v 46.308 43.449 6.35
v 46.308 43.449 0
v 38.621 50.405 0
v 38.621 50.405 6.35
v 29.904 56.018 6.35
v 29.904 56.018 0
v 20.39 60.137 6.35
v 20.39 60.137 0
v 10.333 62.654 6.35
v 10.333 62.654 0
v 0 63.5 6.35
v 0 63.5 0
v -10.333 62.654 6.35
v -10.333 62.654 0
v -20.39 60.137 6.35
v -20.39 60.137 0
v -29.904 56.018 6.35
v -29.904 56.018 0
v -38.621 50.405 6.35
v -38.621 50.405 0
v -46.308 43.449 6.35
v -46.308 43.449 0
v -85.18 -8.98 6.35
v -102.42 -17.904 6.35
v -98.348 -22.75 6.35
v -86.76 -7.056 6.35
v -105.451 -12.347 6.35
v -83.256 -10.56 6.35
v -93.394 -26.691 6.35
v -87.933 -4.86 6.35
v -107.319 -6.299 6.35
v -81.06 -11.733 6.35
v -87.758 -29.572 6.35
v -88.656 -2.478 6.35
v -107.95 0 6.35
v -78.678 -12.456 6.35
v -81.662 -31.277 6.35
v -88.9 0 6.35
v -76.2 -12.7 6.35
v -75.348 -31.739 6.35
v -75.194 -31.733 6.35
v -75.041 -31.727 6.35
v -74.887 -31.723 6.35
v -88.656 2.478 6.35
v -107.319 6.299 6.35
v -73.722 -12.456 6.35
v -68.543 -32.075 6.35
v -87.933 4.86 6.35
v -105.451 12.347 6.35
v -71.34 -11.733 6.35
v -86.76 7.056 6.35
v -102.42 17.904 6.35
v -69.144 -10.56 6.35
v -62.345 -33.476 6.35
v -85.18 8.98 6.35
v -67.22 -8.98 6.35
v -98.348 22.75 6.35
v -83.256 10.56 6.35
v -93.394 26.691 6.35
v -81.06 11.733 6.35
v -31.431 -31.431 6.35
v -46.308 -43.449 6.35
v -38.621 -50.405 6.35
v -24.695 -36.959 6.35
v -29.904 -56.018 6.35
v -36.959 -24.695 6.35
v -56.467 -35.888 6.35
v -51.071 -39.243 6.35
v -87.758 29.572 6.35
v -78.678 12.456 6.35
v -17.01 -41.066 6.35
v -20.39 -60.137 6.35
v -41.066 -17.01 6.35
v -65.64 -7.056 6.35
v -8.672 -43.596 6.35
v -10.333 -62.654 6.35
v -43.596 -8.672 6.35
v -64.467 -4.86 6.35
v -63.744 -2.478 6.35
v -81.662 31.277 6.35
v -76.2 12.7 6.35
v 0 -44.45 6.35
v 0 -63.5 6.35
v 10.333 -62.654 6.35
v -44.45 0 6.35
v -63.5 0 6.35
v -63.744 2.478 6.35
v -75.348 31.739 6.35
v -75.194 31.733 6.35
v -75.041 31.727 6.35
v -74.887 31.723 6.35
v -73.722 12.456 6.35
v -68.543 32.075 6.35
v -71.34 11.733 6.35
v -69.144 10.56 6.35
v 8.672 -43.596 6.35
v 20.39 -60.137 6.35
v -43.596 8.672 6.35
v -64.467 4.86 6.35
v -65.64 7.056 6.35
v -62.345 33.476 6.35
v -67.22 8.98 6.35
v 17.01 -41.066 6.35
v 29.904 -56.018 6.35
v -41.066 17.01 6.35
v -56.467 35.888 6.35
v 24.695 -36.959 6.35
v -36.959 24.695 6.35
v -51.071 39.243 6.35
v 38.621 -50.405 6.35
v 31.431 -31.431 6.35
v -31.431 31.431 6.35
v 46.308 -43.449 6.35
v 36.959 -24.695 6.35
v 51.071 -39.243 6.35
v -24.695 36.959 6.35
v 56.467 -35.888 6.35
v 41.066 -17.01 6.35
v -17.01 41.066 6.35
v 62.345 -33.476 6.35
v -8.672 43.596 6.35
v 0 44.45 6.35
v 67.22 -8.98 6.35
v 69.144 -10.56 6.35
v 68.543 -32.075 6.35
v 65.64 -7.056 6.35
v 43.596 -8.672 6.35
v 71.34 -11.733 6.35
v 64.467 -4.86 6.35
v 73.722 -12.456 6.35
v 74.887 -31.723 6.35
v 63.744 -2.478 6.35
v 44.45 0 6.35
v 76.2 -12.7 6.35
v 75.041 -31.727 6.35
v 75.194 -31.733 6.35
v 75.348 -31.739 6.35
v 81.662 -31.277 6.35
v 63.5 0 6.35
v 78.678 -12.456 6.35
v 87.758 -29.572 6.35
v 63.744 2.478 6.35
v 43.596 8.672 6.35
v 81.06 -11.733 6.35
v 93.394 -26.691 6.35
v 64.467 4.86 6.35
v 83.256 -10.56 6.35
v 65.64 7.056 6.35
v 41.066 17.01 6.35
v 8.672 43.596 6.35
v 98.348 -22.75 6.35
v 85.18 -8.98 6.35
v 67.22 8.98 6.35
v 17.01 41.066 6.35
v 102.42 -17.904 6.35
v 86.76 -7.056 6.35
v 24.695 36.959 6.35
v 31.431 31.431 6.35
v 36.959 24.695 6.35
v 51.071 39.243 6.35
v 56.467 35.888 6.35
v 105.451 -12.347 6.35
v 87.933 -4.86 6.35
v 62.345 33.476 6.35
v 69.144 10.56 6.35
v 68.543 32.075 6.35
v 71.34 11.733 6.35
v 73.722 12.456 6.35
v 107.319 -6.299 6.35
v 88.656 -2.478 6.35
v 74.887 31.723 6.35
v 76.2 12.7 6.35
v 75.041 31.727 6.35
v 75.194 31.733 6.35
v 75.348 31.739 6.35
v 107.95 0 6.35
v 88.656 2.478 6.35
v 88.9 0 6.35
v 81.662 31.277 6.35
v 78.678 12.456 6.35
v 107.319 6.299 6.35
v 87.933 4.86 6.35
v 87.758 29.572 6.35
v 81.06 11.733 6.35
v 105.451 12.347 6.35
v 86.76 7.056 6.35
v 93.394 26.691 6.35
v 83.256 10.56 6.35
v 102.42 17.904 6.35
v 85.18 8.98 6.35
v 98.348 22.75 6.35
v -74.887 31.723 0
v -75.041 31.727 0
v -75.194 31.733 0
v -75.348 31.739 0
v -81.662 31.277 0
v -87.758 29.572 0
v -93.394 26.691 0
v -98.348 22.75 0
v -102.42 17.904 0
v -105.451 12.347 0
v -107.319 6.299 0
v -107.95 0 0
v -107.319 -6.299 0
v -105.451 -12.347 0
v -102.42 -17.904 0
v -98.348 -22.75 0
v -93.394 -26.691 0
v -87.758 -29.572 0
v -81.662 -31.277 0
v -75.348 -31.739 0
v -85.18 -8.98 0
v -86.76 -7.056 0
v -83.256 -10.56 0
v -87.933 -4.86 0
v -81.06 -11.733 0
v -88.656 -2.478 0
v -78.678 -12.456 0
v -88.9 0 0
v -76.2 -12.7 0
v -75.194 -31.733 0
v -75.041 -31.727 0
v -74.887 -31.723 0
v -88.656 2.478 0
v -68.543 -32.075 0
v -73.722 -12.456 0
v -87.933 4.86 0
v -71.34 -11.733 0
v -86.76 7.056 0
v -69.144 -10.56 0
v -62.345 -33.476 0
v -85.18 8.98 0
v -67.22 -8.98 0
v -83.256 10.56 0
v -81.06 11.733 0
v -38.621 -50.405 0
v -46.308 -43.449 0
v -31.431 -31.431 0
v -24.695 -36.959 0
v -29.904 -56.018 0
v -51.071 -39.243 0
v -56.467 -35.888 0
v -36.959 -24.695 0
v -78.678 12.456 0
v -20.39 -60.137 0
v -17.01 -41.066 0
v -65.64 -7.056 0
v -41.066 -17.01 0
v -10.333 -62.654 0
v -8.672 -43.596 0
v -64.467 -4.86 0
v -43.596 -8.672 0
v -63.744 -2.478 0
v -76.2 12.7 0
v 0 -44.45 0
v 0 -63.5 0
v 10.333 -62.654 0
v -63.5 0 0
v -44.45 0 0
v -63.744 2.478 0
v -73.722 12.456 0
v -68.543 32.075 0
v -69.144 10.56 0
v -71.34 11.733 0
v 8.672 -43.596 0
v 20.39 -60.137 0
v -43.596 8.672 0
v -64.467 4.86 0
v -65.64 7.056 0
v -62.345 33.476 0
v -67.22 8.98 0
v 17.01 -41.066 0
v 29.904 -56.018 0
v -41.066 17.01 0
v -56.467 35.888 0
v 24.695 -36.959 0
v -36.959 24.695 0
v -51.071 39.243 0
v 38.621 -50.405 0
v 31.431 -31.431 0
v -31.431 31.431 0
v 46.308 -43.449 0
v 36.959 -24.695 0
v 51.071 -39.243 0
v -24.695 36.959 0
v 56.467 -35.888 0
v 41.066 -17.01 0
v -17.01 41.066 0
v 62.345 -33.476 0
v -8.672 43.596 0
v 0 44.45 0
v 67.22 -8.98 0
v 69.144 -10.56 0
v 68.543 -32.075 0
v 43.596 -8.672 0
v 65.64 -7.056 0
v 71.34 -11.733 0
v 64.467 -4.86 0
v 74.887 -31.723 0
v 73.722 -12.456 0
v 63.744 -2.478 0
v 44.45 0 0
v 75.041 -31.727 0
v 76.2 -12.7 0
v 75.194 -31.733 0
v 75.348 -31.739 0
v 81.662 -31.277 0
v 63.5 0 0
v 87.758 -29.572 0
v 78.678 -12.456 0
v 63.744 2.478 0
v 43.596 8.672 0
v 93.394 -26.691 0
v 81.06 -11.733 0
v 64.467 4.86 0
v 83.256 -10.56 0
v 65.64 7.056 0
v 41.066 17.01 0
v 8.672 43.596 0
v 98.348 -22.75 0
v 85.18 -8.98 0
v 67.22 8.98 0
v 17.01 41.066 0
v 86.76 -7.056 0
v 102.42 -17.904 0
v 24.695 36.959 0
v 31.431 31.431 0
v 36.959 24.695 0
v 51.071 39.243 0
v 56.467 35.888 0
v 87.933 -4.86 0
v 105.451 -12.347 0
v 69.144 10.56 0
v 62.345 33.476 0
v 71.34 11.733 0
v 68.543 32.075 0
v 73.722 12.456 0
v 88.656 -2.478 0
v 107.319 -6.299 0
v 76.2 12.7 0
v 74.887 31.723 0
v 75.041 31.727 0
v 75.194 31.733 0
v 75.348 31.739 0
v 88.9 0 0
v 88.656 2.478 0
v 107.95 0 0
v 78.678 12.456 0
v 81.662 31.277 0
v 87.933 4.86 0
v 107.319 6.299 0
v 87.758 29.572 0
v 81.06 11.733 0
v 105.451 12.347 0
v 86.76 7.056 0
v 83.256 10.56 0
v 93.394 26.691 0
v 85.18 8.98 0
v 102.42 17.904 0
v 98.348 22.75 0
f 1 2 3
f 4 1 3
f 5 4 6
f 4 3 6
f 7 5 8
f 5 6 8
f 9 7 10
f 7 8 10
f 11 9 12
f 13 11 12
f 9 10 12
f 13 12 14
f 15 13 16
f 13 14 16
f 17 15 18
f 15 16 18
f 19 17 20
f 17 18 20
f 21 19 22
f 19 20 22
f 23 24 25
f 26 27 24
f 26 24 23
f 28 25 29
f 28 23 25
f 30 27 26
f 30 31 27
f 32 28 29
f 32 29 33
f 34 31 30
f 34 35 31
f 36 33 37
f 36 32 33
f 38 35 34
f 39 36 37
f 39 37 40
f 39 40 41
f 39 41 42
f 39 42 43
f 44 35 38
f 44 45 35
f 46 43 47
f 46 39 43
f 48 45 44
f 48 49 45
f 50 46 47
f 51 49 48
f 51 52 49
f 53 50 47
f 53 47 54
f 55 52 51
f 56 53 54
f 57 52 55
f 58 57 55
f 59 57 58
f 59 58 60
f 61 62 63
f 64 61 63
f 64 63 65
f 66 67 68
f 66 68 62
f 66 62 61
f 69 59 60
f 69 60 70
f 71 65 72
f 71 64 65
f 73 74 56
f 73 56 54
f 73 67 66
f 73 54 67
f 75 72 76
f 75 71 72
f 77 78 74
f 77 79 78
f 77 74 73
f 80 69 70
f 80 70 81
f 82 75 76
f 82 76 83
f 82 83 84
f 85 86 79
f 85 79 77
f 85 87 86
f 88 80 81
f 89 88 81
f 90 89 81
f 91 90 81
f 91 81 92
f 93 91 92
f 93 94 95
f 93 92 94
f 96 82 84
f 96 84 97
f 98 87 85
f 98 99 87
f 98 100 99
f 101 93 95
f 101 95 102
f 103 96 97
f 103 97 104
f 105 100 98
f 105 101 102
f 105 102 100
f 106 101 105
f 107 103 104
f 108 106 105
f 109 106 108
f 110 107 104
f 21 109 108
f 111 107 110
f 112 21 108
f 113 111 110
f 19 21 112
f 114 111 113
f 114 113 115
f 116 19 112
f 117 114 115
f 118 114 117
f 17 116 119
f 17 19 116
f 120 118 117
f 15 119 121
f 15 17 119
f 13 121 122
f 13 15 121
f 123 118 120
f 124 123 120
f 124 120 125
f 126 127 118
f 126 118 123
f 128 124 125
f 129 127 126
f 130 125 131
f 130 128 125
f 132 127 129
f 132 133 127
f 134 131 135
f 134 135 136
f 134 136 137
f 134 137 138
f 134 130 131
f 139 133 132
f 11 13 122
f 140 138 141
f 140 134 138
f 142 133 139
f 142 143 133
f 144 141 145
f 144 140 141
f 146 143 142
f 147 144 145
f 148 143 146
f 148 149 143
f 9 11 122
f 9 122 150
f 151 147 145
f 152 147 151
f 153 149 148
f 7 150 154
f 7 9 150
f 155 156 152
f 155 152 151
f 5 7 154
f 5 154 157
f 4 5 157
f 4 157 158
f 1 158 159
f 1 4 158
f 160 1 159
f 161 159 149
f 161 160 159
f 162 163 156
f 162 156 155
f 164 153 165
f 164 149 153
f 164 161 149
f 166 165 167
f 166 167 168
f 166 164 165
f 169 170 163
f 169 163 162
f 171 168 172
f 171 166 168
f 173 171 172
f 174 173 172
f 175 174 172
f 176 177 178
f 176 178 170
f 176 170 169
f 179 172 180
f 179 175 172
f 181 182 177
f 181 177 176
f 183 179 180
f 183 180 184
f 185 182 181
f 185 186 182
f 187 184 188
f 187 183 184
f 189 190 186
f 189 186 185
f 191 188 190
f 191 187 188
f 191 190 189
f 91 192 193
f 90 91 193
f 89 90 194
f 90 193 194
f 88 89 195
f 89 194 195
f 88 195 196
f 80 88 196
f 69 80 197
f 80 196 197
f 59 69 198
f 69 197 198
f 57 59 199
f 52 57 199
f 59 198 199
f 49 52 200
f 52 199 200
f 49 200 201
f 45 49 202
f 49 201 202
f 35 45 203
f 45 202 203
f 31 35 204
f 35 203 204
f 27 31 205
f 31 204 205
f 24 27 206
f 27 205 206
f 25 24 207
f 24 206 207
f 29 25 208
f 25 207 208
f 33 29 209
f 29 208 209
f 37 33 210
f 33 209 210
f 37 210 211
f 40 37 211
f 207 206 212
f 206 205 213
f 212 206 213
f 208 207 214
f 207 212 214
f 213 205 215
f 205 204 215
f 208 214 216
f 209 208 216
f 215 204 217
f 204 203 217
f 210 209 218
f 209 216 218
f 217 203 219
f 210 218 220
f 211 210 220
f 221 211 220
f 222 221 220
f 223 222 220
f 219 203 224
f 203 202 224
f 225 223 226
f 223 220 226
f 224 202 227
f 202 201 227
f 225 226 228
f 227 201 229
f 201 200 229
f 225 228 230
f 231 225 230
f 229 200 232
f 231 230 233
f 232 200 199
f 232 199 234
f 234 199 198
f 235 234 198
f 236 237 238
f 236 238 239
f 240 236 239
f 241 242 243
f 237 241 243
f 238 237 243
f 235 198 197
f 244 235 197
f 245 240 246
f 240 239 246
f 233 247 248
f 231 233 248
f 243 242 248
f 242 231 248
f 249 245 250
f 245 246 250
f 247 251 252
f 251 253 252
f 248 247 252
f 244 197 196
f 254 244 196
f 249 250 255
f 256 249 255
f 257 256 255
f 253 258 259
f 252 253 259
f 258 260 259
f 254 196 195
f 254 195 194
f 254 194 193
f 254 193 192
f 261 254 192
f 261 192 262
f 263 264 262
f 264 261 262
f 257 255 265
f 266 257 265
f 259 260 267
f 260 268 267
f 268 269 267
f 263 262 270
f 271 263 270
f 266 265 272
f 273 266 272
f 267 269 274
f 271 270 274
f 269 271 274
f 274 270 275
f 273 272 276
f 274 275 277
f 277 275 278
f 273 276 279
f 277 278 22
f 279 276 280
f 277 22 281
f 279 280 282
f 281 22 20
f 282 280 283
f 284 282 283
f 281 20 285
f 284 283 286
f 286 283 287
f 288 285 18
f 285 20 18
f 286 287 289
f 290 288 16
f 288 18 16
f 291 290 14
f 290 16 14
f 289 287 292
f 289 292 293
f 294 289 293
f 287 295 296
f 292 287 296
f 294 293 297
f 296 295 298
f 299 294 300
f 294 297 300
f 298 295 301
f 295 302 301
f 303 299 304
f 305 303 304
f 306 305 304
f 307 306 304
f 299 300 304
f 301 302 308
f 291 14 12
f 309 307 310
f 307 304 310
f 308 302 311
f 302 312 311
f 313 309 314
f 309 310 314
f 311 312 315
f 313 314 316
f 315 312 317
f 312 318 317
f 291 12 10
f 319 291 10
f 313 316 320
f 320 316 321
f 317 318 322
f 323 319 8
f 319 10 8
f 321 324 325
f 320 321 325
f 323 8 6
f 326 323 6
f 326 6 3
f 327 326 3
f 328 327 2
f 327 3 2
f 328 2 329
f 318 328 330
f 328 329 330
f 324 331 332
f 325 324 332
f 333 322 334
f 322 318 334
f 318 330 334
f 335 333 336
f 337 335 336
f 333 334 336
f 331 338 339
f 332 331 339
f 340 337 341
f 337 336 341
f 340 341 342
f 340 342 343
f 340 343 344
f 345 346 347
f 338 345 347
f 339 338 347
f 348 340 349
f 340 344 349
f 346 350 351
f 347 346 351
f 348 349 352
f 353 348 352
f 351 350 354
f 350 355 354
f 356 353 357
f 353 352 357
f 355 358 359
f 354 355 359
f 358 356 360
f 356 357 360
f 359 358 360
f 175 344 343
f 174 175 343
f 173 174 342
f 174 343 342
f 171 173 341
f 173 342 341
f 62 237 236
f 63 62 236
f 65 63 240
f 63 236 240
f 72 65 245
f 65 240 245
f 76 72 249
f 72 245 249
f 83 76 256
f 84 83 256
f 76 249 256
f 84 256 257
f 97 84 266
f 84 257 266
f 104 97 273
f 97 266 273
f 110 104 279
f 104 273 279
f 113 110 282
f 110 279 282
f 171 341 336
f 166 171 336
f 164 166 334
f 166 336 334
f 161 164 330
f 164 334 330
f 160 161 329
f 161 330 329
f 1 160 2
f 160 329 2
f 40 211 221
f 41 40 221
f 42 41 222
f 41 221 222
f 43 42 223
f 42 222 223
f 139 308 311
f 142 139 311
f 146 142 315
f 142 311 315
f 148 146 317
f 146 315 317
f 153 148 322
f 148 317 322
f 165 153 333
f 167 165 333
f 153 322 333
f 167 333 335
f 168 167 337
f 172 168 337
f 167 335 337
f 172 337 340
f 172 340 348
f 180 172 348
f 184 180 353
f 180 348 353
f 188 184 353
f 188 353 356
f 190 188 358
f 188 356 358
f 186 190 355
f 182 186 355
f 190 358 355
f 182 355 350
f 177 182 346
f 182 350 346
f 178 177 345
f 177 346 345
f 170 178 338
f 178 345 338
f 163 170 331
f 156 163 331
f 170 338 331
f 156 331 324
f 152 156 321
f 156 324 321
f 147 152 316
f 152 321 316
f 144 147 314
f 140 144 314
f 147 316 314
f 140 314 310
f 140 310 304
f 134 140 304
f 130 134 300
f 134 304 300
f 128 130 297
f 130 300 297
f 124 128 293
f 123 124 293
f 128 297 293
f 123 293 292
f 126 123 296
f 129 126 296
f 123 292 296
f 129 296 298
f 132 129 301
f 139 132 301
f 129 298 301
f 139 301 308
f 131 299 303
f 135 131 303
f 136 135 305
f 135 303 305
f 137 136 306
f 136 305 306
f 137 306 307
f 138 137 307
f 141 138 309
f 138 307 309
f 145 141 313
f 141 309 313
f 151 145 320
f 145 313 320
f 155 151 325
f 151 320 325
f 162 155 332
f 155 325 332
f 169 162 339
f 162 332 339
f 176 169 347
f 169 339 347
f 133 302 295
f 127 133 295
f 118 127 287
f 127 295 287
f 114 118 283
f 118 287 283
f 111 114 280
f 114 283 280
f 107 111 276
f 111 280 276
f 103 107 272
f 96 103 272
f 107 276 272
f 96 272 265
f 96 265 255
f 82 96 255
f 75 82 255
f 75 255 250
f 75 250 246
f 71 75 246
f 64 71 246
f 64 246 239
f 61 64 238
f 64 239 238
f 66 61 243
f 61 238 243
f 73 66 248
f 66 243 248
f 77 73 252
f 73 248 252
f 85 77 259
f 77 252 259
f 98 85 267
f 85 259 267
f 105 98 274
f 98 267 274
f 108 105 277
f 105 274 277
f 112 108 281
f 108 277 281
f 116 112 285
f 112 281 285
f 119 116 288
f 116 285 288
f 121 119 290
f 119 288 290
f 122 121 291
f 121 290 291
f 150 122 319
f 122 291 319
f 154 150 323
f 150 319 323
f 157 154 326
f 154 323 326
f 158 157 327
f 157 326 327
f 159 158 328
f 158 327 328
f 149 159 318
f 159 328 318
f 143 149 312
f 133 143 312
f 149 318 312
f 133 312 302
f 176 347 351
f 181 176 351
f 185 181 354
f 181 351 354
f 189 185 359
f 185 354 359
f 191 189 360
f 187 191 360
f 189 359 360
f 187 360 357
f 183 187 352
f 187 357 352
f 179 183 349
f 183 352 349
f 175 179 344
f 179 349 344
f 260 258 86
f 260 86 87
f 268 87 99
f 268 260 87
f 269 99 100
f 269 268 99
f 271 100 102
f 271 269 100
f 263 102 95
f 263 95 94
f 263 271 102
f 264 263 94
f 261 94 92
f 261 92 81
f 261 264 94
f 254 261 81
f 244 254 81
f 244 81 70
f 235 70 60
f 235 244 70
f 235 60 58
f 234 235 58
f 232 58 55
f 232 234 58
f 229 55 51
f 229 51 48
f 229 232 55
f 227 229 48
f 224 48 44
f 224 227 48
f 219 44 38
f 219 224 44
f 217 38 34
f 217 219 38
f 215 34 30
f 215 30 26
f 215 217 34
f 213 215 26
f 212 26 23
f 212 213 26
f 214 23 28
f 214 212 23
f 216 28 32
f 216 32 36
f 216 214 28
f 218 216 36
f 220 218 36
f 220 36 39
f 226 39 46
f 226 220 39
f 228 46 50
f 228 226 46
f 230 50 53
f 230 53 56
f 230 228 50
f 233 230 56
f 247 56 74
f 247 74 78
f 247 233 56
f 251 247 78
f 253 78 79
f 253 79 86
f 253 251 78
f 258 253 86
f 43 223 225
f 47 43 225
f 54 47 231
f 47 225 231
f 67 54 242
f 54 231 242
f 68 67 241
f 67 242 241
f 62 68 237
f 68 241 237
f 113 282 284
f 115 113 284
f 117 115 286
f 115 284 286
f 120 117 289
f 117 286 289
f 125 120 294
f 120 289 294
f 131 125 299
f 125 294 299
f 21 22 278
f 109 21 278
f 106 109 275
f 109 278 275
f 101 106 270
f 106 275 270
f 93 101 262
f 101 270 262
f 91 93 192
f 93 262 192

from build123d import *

# Parameters (mm, degrees)
F0_R     = 12.7
F1_DEPTH = 6.35


with BuildPart() as f1:
    # F0 (on Top) → F1 (new body)
    with BuildSketch(Plane.XY):
        with BuildLine():
            ThreePointArc((-57.94375, 25.976370723), (-52.8530385151, 35.1966805213), (-46.3083103346, 43.4487099228))
            ThreePointArc((-46.3083103346, 43.4487099228), (-59.3557480022, 34.5595657373), (-74.8865363941, 31.7228200726))
            ThreePointArc((-74.8865363941, 31.7228200726), (-66.002017715, 30.0676513435), (-57.94375, 25.976370723))
        make_face()
        with BuildLine():
            ThreePointArc((-44.45, 0), (-48.024670033, 14.636026826), (-57.94375, 25.976370723))
            ThreePointArc((-57.94375, 25.976370723), (-62.0954029096, 13.2819779212), (-63.5, 0))
            ThreePointArc((-63.5, 0), (-62.0954029096, -13.2819779212), (-57.94375, -25.976370723))
            ThreePointArc((-57.94375, -25.976370723), (-48.024670033, -14.636026826), (-44.45, 0))
        make_face()
        with BuildLine():
            ThreePointArc((-63.5, 0), (-62.0954029096, 13.2819779212), (-57.94375, 25.976370723))
            ThreePointArc((-57.94375, 25.976370723), (-66.002017715, 30.0676513435), (-74.8865363941, 31.7228200726))
            ThreePointArc((-74.8865363941, 31.7228200726), (-75.1174911921, 31.7299983006), (-75.3483982089, 31.7385770694))
            ThreePointArc((-75.3483982089, 31.7385770694), (-107.95, 0), (-75.3483982089, -31.7385770694))
            ThreePointArc((-75.3483982089, -31.7385770694), (-75.1174911921, -31.7299983006), (-74.8865363941, -31.7228200726))
            ThreePointArc((-74.8865363941, -31.7228200726), (-66.002017715, -30.0676513435), (-57.94375, -25.976370723))
            ThreePointArc((-57.94375, -25.976370723), (-62.0954029096, -13.2819779212), (-63.5, 0))
        make_face()
        with Locations((-76.2, 0)):
            Circle(F0_R, mode=Mode.SUBTRACT)
        with BuildLine():
            ThreePointArc((57.94375, -25.976370723), (48.024670033, -14.636026826), (44.45, 0))
            ThreePointArc((44.45, 0), (0, -44.45), (-44.45, 0))
            ThreePointArc((-44.45, 0), (-48.024670033, -14.636026826), (-57.94375, -25.976370723))
            ThreePointArc((-57.94375, -25.976370723), (-52.8530385151, -35.1966805213), (-46.3083103346, -43.4487099228))
            ThreePointArc((-46.3083103346, -43.4487099228), (0, -63.5), (46.3083103346, -43.4487099228))
            ThreePointArc((46.3083103346, -43.4487099228), (52.8530385151, -35.1966805213), (57.94375, -25.976370723))
        make_face()
        with BuildLine():
            ThreePointArc((-46.3083103346, -43.4487099228), (-52.8530385151, -35.1966805213), (-57.94375, -25.976370723))
            ThreePointArc((-57.94375, -25.976370723), (-66.002017715, -30.0676513435), (-74.8865363941, -31.7228200726))
            ThreePointArc((-74.8865363941, -31.7228200726), (-59.3557480022, -34.5595657373), (-46.3083103346, -43.4487099228))
        make_face()
        with BuildLine():
            ThreePointArc((57.94375, 25.976370723), (52.8530385151, 35.1966805213), (46.3083103346, 43.4487099228))
            ThreePointArc((46.3083103346, 43.4487099228), (0, 63.5), (-46.3083103346, 43.4487099228))
            ThreePointArc((-46.3083103346, 43.4487099228), (-52.8530385151, 35.1966805213), (-57.94375, 25.976370723))
            ThreePointArc((-57.94375, 25.976370723), (-48.024670033, 14.636026826), (-44.45, 0))
            ThreePointArc((-44.45, 0), (0, 44.45), (44.45, 0))
            ThreePointArc((44.45, 0), (48.024670033, 14.636026826), (57.94375, 25.976370723))
        make_face()
        with BuildLine():
            ThreePointArc((63.5, 0), (62.0954029096, 13.2819779212), (57.94375, 25.976370723))
            ThreePointArc((57.94375, 25.976370723), (48.024670033, 14.636026826), (44.45, 0))
            ThreePointArc((44.45, 0), (48.024670033, -14.636026826), (57.94375, -25.976370723))
            ThreePointArc((57.94375, -25.976370723), (62.0954029096, -13.2819779212), (63.5, 0))
        make_face()
        with BuildLine():
            ThreePointArc((74.8865363941, 31.7228200726), (66.002017715, 30.0676513435), (57.94375, 25.976370723))
            ThreePointArc((57.94375, 25.976370723), (62.0954029096, 13.2819779212), (63.5, 0))
            ThreePointArc((63.5, 0), (62.0954029096, -13.2819779212), (57.94375, -25.976370723))
            ThreePointArc((57.94375, -25.976370723), (66.002017715, -30.0676513435), (74.8865363941, -31.7228200726))
            ThreePointArc((74.8865363941, -31.7228200726), (75.1174911921, -31.7299983006), (75.3483982089, -31.7385770694))
            ThreePointArc((75.3483982089, -31.7385770694), (98.3475071186, -22.7497346893), (107.95, 0))
            ThreePointArc((107.95, 0), (98.3475071186, 22.7497346893), (75.3483982089, 31.7385770694))
            ThreePointArc((75.3483982089, 31.7385770694), (75.1174911921, 31.7299983006), (74.8865363941, 31.7228200726))
        make_face()
        with BuildLine():
            ThreePointArc((88.9, 0), (76.2, -12.7), (63.5, 0))
            ThreePointArc((63.5, 0), (76.2, 12.7), (88.9, 0))
        make_face(mode=Mode.SUBTRACT)
        with BuildLine():
            ThreePointArc((74.8865363941, 31.7228200726), (59.3557480022, 34.5595657373), (46.3083103346, 43.4487099228))
            ThreePointArc((46.3083103346, 43.4487099228), (52.8530385151, 35.1966805213), (57.94375, 25.976370723))
            ThreePointArc((57.94375, 25.976370723), (66.002017715, 30.0676513435), (74.8865363941, 31.7228200726))
        make_face()
        with BuildLine():
            ThreePointArc((74.8865363941, -31.7228200726), (66.002017715, -30.0676513435), (57.94375, -25.976370723))
            ThreePointArc((57.94375, -25.976370723), (52.8530385151, -35.1966805213), (46.3083103346, -43.4487099228))
            ThreePointArc((46.3083103346, -43.4487099228), (59.3557480022, -34.5595657373), (74.8865363941, -31.7228200726))
        make_face()
    extrude(amount=F1_DEPTH)


solid = f1.part
